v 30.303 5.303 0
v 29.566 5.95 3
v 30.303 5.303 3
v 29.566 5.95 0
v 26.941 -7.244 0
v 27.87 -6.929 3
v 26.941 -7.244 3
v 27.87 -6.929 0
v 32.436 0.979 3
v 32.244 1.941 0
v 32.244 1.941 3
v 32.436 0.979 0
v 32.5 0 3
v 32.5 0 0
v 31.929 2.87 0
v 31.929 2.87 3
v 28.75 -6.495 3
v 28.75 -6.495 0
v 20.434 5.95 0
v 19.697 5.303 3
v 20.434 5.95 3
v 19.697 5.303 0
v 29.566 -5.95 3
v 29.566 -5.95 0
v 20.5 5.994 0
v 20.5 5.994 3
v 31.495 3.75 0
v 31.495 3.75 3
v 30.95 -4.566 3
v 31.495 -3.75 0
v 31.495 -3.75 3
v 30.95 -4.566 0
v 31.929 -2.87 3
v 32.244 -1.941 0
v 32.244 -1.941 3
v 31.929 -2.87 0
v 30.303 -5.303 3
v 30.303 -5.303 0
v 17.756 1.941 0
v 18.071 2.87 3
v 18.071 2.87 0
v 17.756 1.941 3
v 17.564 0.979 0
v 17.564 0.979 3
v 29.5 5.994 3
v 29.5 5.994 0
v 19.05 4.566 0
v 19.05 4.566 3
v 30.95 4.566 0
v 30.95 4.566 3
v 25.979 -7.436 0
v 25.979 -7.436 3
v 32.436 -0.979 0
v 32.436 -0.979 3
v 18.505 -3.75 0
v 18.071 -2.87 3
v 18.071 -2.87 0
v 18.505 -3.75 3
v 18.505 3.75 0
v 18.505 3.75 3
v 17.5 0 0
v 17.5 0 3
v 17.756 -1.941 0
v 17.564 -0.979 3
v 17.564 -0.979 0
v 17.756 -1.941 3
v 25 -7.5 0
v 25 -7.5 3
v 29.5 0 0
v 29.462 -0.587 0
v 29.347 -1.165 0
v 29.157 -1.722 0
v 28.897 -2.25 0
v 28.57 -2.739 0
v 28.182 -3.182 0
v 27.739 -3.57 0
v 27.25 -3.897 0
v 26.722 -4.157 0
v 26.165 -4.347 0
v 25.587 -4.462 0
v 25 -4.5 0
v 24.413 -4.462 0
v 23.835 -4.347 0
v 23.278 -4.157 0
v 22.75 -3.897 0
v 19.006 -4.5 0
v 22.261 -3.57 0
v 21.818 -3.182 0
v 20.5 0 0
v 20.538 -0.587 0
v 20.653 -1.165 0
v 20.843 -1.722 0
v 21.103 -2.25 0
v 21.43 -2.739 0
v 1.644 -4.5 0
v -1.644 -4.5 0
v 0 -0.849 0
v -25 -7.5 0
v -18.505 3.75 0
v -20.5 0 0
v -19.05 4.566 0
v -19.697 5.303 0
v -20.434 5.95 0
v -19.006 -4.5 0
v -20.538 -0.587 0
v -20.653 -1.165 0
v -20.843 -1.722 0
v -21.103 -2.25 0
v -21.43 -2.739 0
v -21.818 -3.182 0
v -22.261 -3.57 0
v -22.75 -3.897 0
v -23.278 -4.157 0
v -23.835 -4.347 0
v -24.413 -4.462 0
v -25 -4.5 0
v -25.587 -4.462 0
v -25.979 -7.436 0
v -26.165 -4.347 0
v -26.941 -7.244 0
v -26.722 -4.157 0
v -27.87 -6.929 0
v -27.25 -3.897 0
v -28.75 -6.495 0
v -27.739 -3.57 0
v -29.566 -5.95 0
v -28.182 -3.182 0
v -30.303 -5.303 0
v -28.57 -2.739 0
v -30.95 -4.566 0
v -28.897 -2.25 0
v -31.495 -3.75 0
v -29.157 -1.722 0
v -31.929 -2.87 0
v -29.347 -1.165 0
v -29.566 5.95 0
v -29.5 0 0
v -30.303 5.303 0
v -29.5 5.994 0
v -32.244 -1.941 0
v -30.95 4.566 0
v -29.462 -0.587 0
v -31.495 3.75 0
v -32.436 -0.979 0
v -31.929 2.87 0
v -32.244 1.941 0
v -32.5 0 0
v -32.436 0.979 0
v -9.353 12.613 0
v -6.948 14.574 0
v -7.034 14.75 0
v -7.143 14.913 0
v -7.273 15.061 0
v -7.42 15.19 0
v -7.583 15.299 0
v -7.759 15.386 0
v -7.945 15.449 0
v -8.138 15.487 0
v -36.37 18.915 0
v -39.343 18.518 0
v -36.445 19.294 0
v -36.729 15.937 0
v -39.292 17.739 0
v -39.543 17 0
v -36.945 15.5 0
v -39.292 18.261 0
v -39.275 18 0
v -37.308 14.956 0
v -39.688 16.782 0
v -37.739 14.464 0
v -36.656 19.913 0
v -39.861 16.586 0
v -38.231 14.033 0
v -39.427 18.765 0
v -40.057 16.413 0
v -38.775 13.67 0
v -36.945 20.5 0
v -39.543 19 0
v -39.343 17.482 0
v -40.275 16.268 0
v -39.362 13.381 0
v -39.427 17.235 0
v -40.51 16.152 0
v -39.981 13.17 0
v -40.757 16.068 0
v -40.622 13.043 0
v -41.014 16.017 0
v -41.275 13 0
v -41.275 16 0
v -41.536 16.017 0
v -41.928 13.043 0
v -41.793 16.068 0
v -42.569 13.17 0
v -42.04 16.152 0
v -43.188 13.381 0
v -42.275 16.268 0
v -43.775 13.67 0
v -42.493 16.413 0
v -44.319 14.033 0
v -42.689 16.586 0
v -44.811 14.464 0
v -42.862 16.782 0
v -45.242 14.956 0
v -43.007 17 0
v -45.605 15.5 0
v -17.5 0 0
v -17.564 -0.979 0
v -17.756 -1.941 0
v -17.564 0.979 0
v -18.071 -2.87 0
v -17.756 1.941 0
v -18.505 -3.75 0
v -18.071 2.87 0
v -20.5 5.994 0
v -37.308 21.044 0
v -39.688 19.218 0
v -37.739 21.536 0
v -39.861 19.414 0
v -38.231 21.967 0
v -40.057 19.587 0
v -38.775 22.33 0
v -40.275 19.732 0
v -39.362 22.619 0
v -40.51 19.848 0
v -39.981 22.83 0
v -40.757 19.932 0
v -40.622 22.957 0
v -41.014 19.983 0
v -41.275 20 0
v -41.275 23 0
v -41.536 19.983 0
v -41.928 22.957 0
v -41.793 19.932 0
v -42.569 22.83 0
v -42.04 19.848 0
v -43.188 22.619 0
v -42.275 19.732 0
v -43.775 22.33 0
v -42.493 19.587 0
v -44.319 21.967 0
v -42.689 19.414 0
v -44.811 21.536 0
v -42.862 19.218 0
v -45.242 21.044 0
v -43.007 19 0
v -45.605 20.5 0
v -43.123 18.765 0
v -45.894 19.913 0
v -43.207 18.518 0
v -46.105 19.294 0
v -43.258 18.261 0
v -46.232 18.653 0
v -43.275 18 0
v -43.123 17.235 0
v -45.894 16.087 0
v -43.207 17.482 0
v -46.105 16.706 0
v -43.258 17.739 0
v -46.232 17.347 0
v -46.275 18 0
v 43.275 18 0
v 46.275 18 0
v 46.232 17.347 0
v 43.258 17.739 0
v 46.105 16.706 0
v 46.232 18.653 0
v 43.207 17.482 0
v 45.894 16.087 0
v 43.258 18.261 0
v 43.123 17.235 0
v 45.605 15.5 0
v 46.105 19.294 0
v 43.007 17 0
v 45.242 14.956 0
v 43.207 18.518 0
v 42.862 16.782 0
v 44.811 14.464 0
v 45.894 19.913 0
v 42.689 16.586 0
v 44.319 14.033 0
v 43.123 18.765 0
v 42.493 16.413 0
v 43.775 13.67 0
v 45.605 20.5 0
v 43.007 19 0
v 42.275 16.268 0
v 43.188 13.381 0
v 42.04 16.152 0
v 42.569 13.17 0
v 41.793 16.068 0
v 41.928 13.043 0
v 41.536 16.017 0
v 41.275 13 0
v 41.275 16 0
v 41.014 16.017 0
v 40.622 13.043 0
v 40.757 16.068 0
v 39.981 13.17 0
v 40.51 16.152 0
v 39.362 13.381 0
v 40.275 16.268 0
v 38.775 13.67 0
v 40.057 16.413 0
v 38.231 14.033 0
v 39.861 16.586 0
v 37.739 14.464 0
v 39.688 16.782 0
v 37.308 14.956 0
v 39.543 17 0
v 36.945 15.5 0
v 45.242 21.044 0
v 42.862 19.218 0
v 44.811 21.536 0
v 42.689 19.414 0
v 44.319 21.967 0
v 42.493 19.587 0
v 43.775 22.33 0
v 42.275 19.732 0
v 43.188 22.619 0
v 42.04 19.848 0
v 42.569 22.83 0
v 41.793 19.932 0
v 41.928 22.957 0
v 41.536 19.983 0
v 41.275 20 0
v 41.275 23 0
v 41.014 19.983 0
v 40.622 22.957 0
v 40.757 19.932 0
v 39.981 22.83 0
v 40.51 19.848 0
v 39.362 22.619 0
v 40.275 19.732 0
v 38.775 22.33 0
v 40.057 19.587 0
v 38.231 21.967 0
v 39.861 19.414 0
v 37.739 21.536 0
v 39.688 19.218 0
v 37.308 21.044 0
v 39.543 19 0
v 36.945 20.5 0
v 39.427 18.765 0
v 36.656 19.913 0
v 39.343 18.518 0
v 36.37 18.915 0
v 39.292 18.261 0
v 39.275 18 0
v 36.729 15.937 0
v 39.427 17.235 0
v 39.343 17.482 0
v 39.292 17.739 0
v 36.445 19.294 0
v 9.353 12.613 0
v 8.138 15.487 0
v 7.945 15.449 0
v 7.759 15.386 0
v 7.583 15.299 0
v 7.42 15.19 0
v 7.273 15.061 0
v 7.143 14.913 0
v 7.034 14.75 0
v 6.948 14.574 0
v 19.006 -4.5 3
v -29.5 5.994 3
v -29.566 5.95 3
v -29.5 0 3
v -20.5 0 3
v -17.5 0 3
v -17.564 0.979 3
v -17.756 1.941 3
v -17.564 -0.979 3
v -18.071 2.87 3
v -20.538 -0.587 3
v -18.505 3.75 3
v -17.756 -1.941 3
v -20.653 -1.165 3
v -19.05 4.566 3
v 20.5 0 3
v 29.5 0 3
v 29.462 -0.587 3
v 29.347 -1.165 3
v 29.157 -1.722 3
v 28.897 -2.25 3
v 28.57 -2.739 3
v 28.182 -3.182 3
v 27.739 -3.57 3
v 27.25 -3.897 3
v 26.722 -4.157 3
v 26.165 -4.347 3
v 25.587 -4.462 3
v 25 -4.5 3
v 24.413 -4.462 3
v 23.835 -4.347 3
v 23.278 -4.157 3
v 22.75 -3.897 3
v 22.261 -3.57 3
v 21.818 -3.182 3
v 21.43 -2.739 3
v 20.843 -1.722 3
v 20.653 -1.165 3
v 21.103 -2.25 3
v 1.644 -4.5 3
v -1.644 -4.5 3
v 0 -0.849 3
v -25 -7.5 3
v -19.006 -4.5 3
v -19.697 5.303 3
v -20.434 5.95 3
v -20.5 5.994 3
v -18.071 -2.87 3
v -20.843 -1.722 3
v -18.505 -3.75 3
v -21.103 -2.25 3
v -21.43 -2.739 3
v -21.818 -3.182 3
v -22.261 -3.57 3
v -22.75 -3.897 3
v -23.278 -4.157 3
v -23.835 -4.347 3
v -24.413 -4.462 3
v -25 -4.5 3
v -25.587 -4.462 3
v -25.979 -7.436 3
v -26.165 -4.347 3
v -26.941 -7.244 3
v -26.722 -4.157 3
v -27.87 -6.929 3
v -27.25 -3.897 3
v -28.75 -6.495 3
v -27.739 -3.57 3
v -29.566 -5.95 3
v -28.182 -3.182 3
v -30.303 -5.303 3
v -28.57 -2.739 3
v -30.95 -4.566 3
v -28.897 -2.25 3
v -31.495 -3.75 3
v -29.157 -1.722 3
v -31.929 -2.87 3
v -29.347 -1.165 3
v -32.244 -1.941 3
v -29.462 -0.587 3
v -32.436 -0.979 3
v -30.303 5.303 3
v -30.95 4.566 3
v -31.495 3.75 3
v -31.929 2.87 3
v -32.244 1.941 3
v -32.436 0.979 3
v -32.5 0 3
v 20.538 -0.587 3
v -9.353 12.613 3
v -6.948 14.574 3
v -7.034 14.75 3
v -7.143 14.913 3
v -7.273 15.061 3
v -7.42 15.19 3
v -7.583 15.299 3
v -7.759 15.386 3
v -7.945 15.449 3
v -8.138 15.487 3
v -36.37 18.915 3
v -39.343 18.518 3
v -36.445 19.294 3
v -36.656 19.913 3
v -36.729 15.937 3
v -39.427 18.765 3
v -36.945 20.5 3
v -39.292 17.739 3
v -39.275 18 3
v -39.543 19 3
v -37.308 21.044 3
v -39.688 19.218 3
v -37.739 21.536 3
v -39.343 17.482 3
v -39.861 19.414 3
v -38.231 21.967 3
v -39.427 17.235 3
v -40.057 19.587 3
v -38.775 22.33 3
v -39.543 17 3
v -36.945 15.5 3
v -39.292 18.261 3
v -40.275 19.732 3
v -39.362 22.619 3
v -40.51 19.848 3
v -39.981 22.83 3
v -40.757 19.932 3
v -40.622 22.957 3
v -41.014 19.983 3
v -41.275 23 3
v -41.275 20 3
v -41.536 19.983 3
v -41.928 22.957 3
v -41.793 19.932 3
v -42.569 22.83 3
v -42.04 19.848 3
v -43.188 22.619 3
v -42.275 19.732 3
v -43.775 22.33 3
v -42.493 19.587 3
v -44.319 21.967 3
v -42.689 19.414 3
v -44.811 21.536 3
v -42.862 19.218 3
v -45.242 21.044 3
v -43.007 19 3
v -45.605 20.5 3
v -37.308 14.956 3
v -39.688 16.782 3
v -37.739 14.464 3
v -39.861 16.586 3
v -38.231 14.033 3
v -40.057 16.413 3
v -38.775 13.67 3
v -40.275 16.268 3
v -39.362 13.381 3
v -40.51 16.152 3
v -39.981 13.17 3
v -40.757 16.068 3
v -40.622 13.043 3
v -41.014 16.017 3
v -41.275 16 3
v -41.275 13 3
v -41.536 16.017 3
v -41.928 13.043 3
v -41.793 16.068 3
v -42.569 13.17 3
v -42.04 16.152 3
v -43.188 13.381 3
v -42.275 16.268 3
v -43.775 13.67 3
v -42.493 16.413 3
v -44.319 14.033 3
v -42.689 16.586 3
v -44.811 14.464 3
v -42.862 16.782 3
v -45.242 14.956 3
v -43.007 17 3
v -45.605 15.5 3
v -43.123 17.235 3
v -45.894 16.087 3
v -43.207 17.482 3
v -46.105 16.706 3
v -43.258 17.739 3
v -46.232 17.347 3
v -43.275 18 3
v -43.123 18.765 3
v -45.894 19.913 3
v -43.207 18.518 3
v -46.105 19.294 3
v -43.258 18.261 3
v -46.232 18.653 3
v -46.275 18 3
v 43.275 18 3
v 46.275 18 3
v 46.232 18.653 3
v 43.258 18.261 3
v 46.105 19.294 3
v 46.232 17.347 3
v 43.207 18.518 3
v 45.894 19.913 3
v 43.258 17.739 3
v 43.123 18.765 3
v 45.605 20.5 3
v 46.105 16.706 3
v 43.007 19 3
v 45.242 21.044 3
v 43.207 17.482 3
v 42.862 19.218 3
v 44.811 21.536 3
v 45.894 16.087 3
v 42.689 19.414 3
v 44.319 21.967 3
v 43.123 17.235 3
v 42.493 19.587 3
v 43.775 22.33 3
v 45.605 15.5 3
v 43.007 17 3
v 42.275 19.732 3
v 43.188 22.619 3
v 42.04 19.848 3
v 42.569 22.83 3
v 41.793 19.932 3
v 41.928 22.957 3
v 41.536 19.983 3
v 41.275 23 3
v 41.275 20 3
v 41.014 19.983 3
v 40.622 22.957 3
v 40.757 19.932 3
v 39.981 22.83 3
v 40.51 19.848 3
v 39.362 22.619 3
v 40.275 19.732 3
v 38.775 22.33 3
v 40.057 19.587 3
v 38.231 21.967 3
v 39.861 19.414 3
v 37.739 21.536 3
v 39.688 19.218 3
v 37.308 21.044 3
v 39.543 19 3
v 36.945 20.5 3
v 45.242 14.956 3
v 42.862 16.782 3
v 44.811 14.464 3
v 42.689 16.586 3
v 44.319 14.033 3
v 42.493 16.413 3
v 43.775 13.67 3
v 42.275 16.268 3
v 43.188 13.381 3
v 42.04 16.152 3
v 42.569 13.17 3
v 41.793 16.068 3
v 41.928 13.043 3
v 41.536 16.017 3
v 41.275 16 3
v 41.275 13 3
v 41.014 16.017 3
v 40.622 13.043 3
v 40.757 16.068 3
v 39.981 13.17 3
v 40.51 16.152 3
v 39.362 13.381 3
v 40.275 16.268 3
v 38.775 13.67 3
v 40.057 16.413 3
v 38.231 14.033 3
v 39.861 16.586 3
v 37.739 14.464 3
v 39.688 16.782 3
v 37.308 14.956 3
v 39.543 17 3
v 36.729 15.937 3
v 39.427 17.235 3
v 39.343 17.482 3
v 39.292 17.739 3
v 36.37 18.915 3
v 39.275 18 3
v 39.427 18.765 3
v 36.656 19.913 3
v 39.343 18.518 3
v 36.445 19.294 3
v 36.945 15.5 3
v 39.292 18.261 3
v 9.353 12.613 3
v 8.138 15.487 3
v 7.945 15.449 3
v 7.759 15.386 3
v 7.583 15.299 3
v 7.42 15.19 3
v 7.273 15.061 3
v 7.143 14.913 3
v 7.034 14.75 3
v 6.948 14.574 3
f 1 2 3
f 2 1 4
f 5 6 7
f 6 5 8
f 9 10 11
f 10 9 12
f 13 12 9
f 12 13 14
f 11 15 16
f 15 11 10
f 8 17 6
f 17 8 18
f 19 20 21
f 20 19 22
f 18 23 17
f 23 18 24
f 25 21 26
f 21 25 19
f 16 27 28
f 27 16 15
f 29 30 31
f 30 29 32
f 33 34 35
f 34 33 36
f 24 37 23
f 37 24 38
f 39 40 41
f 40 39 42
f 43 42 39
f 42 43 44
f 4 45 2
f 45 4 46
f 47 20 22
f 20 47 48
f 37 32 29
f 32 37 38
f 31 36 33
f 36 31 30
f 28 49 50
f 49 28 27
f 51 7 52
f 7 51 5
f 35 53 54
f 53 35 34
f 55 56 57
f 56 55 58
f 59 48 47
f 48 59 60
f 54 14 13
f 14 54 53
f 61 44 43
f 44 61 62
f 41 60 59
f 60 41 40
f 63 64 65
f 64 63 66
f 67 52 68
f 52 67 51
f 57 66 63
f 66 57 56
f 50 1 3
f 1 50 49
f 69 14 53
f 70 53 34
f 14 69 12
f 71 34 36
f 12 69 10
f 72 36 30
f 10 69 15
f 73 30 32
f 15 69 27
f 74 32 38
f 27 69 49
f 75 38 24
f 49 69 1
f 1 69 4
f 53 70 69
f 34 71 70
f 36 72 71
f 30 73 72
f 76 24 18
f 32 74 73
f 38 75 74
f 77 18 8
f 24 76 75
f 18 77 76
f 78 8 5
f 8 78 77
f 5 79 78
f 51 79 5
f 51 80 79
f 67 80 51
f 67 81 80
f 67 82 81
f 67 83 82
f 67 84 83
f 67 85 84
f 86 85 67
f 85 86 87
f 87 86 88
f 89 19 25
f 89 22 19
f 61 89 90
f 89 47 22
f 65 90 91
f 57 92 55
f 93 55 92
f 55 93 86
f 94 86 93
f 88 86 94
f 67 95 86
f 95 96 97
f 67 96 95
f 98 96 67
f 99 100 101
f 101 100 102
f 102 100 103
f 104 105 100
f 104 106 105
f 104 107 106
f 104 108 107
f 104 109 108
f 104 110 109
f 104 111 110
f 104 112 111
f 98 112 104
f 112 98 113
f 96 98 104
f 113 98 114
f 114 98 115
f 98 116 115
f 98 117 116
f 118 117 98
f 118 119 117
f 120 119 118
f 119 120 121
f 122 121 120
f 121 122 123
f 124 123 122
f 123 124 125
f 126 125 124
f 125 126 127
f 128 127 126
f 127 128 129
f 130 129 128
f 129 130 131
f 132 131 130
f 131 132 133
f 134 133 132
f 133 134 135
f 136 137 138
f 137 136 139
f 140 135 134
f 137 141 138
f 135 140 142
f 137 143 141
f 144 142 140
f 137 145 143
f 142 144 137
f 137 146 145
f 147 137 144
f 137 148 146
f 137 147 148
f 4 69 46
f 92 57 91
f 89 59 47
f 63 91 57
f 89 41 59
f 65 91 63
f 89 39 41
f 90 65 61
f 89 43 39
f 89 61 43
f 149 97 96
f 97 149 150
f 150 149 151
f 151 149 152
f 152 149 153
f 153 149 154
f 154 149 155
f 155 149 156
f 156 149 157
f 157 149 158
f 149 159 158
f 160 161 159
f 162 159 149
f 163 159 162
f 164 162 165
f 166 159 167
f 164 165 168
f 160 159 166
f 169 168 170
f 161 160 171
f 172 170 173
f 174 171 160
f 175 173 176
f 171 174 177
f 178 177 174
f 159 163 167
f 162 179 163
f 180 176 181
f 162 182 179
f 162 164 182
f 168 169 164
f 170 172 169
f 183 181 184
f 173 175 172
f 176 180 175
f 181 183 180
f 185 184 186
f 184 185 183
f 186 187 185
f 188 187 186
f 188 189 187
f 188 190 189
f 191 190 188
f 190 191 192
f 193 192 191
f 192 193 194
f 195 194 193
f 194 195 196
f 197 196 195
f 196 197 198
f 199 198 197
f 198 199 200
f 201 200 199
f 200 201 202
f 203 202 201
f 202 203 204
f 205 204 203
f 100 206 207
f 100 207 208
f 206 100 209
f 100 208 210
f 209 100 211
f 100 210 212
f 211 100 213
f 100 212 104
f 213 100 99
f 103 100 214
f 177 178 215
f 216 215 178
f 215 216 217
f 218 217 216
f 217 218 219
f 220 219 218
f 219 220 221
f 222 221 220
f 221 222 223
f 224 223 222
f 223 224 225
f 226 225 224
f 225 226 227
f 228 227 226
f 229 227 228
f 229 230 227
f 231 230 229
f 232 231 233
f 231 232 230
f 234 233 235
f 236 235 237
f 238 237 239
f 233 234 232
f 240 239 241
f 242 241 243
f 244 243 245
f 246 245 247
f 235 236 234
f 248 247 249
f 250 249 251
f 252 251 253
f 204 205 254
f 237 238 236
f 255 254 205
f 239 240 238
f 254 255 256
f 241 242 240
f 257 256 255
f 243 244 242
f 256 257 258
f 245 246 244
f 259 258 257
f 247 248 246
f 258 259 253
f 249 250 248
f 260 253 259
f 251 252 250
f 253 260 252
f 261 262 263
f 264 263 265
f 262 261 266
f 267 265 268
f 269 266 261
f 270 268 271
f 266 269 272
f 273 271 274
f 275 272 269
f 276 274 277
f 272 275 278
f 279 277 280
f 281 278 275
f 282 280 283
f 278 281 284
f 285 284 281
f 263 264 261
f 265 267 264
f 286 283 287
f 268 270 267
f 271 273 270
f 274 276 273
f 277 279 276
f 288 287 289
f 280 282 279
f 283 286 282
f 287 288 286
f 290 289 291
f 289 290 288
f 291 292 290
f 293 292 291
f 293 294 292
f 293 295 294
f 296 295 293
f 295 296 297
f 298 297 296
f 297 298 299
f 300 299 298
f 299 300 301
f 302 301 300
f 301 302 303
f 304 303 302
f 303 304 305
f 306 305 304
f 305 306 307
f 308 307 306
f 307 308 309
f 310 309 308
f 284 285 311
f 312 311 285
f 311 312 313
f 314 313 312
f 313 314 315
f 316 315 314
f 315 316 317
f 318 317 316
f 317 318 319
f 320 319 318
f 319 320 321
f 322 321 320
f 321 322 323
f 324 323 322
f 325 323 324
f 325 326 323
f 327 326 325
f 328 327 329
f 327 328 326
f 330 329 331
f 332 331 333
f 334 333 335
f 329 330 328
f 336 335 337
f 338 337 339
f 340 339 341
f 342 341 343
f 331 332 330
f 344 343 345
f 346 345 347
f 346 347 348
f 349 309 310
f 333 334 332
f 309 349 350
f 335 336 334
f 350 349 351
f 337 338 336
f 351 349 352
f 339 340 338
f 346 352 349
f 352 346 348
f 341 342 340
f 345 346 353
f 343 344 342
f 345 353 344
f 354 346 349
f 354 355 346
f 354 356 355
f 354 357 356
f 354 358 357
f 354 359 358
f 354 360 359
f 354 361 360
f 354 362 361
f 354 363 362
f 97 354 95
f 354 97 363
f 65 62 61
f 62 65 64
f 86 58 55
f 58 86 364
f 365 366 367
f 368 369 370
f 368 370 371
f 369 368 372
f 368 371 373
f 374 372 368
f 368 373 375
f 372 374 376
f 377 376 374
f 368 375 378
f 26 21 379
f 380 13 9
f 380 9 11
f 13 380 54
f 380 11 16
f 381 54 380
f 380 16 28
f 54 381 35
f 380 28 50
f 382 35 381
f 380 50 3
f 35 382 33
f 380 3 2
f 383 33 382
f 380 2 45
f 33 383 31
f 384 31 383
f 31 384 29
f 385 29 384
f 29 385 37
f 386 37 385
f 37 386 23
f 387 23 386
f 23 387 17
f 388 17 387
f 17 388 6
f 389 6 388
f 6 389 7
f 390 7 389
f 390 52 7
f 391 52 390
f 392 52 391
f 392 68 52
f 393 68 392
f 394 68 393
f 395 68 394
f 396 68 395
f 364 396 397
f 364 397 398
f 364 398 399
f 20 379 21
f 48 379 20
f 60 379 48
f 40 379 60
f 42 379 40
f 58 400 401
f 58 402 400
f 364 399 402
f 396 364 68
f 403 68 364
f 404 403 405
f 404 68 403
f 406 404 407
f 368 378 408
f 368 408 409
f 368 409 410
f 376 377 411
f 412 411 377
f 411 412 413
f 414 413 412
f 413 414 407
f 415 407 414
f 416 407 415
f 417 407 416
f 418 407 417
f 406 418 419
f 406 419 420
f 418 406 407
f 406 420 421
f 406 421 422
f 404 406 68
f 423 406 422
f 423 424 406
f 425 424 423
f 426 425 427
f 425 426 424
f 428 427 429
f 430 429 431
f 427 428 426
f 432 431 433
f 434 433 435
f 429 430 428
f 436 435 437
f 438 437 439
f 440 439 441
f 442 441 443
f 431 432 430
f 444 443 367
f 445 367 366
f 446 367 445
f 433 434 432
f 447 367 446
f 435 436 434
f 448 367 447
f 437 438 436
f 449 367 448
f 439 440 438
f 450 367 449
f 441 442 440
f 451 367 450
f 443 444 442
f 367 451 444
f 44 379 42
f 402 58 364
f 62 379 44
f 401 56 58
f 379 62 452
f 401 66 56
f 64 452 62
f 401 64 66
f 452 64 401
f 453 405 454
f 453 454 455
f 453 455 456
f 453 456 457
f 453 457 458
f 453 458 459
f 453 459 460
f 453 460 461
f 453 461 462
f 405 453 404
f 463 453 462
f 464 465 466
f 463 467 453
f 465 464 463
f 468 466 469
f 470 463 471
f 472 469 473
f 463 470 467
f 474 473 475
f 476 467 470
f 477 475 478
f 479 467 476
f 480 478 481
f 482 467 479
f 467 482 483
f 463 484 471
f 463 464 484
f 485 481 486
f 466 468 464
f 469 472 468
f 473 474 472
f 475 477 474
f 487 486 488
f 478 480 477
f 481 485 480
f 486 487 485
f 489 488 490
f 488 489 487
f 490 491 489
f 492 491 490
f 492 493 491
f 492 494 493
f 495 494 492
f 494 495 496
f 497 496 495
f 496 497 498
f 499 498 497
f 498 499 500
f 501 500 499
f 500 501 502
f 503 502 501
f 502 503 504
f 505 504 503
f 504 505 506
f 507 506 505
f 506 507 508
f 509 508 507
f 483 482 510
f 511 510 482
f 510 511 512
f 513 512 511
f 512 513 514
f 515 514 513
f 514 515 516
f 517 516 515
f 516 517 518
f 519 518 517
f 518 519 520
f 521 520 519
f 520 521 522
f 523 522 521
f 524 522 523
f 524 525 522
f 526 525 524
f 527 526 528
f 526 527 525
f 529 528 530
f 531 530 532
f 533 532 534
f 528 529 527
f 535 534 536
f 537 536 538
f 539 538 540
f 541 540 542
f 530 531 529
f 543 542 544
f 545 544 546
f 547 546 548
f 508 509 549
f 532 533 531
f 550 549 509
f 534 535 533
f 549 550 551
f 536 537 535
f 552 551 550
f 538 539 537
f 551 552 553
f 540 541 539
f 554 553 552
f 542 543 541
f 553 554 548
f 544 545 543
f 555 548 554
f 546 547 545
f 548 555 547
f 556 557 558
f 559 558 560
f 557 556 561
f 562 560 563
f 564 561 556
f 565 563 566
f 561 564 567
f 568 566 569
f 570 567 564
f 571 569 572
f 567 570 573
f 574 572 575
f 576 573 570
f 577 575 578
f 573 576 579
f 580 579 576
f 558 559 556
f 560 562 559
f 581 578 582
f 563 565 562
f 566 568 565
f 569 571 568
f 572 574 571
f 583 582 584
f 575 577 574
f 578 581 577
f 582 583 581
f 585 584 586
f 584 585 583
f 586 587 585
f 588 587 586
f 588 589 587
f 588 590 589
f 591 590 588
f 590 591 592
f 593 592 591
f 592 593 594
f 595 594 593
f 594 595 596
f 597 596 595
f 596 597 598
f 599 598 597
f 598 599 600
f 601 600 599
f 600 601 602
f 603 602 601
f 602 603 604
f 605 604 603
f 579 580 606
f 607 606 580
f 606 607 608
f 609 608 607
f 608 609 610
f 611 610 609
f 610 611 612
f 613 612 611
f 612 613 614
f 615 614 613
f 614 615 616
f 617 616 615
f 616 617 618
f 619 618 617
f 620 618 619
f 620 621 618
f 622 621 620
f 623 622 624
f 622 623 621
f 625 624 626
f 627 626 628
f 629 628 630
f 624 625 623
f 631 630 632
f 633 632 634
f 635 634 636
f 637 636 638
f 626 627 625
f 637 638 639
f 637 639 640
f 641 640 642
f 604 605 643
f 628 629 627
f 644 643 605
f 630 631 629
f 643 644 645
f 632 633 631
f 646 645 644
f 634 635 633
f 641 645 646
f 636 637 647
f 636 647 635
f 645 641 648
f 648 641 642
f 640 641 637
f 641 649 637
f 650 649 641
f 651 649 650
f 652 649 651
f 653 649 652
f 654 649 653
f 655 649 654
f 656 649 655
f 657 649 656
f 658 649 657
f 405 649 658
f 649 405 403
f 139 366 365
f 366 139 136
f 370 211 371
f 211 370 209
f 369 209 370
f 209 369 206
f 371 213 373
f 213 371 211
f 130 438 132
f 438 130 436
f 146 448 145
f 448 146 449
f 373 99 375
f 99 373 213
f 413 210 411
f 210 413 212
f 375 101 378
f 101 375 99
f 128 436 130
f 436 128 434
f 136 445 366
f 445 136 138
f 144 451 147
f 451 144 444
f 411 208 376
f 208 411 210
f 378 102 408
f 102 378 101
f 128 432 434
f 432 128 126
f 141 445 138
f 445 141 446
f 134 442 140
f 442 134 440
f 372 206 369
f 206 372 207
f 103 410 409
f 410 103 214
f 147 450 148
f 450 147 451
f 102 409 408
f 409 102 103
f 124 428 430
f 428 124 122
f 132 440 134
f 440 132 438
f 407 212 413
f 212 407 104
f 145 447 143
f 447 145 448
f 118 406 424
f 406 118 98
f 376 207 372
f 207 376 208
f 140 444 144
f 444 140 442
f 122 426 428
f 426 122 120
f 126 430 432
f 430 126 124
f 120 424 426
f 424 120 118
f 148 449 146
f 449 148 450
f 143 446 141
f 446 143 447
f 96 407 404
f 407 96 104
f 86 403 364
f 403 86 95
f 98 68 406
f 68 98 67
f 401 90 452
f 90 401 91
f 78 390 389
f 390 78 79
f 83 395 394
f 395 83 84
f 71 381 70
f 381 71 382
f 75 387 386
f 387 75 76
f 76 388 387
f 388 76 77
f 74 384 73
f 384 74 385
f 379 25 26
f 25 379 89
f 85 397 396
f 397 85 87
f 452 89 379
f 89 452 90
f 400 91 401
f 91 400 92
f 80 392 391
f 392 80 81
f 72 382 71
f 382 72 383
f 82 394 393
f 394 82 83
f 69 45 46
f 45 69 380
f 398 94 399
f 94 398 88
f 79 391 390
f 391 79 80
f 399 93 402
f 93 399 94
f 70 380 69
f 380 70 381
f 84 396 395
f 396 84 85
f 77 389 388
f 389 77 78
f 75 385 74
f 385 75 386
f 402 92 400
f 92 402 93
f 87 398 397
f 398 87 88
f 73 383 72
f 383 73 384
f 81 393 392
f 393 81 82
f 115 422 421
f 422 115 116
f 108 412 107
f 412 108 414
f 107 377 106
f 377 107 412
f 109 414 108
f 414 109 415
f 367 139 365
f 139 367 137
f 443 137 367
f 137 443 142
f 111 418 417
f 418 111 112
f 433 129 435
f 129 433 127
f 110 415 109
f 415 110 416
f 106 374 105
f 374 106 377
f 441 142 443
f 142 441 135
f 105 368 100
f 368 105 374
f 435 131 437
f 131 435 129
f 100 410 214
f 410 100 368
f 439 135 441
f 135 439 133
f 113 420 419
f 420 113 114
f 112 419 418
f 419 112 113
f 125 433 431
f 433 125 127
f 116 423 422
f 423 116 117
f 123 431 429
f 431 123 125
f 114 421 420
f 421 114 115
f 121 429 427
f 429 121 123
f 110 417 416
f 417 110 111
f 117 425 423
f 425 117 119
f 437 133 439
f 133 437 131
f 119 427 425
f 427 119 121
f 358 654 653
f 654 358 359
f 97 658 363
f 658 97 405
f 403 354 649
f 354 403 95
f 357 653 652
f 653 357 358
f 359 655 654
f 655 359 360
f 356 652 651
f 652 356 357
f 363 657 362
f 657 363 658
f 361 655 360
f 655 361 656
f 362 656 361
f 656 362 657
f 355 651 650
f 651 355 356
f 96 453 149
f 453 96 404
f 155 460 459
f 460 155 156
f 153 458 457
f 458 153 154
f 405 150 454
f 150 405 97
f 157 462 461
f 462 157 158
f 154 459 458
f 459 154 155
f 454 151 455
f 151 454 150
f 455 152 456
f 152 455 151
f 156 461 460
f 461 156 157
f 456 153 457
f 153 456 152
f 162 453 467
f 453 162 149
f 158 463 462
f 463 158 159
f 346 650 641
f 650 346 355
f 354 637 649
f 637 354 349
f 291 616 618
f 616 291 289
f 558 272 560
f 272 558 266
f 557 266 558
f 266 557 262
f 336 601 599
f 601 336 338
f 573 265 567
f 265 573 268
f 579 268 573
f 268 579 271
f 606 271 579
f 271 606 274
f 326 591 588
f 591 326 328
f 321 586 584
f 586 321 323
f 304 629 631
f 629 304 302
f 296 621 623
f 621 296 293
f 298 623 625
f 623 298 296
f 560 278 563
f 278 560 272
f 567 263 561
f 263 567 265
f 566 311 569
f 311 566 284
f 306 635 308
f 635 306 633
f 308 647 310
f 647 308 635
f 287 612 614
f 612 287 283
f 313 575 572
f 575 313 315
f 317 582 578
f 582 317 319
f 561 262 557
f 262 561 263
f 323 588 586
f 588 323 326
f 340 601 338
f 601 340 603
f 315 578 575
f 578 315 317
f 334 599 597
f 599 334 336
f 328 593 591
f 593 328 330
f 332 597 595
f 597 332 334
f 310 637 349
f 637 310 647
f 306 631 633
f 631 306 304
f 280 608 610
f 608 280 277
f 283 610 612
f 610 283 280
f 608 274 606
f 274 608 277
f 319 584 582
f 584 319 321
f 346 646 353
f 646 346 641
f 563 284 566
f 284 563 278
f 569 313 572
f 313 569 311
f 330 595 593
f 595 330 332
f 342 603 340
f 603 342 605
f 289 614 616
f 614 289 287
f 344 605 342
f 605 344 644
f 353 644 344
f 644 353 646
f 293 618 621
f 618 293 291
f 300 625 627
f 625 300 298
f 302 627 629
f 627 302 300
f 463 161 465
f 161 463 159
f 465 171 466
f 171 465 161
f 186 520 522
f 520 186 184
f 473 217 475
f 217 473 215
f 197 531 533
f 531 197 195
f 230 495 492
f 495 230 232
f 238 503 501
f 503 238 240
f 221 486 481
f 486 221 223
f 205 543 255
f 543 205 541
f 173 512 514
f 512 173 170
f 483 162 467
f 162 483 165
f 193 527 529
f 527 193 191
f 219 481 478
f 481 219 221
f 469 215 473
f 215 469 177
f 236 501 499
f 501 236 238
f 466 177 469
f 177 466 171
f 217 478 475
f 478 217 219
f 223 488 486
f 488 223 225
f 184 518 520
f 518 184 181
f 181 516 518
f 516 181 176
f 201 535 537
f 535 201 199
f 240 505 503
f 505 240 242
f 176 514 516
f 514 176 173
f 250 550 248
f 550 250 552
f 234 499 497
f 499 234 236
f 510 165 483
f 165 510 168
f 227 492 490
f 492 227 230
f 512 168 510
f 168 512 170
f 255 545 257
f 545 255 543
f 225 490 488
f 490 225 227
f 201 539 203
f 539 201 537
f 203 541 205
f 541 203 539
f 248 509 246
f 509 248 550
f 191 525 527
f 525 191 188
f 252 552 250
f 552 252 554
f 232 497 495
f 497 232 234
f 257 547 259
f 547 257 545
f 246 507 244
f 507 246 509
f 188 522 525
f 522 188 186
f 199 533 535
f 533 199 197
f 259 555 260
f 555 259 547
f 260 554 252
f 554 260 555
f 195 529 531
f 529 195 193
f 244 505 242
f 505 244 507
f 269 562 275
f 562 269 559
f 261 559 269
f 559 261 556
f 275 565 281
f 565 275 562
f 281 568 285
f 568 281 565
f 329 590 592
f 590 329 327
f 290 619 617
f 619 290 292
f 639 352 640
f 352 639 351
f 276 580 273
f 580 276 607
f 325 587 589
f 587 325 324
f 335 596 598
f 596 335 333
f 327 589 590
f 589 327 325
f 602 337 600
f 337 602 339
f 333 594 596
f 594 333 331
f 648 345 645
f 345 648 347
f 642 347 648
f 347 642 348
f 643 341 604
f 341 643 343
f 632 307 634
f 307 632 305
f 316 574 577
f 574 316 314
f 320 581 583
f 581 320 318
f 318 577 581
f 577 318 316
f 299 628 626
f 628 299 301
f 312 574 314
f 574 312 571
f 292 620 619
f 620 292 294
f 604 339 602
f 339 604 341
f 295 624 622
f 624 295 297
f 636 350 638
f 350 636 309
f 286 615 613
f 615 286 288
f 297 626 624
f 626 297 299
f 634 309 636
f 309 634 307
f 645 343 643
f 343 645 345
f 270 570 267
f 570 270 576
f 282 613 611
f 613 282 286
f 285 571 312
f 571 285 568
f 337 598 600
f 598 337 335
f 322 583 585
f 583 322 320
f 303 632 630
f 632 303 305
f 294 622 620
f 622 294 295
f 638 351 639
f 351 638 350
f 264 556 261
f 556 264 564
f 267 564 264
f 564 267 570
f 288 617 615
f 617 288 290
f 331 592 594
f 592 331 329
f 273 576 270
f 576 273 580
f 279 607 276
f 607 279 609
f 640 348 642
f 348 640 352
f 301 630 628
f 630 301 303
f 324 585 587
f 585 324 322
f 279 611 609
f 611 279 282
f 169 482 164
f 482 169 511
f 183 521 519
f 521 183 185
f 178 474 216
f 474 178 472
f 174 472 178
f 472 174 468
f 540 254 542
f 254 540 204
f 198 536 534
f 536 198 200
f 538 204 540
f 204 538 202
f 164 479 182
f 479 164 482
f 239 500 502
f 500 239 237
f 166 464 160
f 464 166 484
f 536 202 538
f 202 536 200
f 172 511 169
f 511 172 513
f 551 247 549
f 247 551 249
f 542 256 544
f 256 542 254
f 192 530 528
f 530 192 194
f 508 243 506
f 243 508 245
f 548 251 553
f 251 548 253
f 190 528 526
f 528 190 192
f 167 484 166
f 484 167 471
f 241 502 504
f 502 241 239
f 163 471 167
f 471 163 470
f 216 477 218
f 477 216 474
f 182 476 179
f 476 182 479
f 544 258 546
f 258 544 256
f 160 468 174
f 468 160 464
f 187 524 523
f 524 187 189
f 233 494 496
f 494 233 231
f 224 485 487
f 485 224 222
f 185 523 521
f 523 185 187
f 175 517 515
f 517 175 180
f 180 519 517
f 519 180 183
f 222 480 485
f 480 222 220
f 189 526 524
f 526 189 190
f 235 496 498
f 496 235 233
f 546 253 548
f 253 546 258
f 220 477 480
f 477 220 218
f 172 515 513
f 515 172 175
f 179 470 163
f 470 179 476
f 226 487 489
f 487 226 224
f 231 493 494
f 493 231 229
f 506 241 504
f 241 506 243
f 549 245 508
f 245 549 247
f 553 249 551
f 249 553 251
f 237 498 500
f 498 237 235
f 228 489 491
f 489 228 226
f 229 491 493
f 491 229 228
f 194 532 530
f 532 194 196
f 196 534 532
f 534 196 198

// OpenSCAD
//Distance Between the X Axis Bars
X_Bar_Distance=50;

//The Diameter of the X Axis Bars
X_Bar_Diameter=9; 

//The Distance Between the Screw Holes on the Fan
Fan_Screw_Distance=82.55; 

//The Diameter of the Screw to Hold the Fan in Place
Fan_Screw_Diameter=4;

//The Thickness of the Holder. This affects the thickness on the Z axis as well as on the X/Y Axis
Overall_Thickness=3;

//The Resolution of the Holder
Resolution=48; 

//Ignore this variable
$fn=Resolution;

fan_holder();

module fan_holder(){
difference(){
	union(){
	
	
		translate([X_Bar_Distance/2,0,0])
			cylinder(Overall_Thickness, (X_Bar_Diameter)/2+Overall_Thickness,(X_Bar_Diameter)/2+Overall_Thickness);
		
		translate([X_Bar_Distance/-2,0,0])
			cylinder(Overall_Thickness, (X_Bar_Diameter)/2+Overall_Thickness,(X_Bar_Diameter)/2+Overall_Thickness);
		
		translate([0,(X_Bar_Diameter+Overall_Thickness)/-2,Overall_Thickness/2])
		cube([X_Bar_Distance,Overall_Thickness, Overall_Thickness],center = true);
	
	}
		hull(){
		
		translate([X_Bar_Distance/2,0,-1])
			cylinder(Overall_Thickness+2, (X_Bar_Diameter)/2,(X_Bar_Diameter)/2);
		
		translate([X_Bar_Distance/2,X_Bar_Diameter*3,-1])
			cylinder(Overall_Thickness+2, (X_Bar_Diameter)/2,(X_Bar_Diameter)/2);
	
	}

	hull(){
		translate([X_Bar_Distance/-2,0,-1])
			cylinder(Overall_Thickness+2, (X_Bar_Diameter)/2,(X_Bar_Diameter)/2);
		
		translate([X_Bar_Distance/-2,X_Bar_Diameter*3,-1])
			cylinder(Overall_Thickness+2, (X_Bar_Diameter)/2,(X_Bar_Diameter)/2);
	
	}

}
difference(){
union(){

hull(){
translate([0,(X_Bar_Diameter)/-2,0])
cylinder(Overall_Thickness,(Overall_Thickness)/2,(Overall_Thickness)/2);

translate([X_Bar_Distance/6,(X_Bar_Diameter+Overall_Thickness+2),0])
cylinder(Overall_Thickness,(Overall_Thickness)/2,(Overall_Thickness)/2);
}

hull(){
translate([0,(X_Bar_Diameter)/-2,0])
cylinder(Overall_Thickness,(Overall_Thickness)/2,(Overall_Thickness)/2);

translate([X_Bar_Distance/-6,(X_Bar_Diameter+Overall_Thickness+2),0])
cylinder(Overall_Thickness,(Overall_Thickness)/2,(Overall_Thickness)/2);
}

hull(){
translate([X_Bar_Distance/-6,(X_Bar_Diameter+Overall_Thickness+2),0])
cylinder(Overall_Thickness,(Overall_Thickness)/2,(Overall_Thickness)/2);

translate([Fan_Screw_Distance/-2,(X_Bar_Diameter+Overall_Thickness)*1.5,0])
cylinder(Overall_Thickness,(Overall_Thickness)/2,(Overall_Thickness)/2);
}

hull(){
translate([X_Bar_Distance/6,(X_Bar_Diameter+Overall_Thickness+2),0])
cylinder(Overall_Thickness,(Overall_Thickness)/2,(Overall_Thickness)/2);

translate([Fan_Screw_Distance/2,(X_Bar_Diameter+Overall_Thickness)*1.5,0])
cylinder(Overall_Thickness,(Overall_Thickness)/2,(Overall_Thickness)/2);
}

translate([Fan_Screw_Distance/2,(X_Bar_Diameter+Overall_Thickness)*1.5,0])
cylinder(Overall_Thickness,(Fan_Screw_Diameter)/2+Overall_Thickness,(Fan_Screw_Diameter)/2+Overall_Thickness);

translate([Fan_Screw_Distance/-2,(X_Bar_Diameter+Overall_Thickness)*1.5,0])
cylinder(Overall_Thickness,(Fan_Screw_Diameter)/2+Overall_Thickness,(Fan_Screw_Diameter)/2+Overall_Thickness);

}

translate([Fan_Screw_Distance/2,(X_Bar_Diameter+Overall_Thickness)*1.5,-1])
cylinder(Overall_Thickness+2,(Fan_Screw_Diameter)/2,(Fan_Screw_Diameter)/2);

translate([Fan_Screw_Distance/-2,(X_Bar_Diameter+Overall_Thickness)*1.5,-1])
cylinder(Overall_Thickness+2,(Fan_Screw_Diameter)/2,(Fan_Screw_Diameter)/2);

}
}
